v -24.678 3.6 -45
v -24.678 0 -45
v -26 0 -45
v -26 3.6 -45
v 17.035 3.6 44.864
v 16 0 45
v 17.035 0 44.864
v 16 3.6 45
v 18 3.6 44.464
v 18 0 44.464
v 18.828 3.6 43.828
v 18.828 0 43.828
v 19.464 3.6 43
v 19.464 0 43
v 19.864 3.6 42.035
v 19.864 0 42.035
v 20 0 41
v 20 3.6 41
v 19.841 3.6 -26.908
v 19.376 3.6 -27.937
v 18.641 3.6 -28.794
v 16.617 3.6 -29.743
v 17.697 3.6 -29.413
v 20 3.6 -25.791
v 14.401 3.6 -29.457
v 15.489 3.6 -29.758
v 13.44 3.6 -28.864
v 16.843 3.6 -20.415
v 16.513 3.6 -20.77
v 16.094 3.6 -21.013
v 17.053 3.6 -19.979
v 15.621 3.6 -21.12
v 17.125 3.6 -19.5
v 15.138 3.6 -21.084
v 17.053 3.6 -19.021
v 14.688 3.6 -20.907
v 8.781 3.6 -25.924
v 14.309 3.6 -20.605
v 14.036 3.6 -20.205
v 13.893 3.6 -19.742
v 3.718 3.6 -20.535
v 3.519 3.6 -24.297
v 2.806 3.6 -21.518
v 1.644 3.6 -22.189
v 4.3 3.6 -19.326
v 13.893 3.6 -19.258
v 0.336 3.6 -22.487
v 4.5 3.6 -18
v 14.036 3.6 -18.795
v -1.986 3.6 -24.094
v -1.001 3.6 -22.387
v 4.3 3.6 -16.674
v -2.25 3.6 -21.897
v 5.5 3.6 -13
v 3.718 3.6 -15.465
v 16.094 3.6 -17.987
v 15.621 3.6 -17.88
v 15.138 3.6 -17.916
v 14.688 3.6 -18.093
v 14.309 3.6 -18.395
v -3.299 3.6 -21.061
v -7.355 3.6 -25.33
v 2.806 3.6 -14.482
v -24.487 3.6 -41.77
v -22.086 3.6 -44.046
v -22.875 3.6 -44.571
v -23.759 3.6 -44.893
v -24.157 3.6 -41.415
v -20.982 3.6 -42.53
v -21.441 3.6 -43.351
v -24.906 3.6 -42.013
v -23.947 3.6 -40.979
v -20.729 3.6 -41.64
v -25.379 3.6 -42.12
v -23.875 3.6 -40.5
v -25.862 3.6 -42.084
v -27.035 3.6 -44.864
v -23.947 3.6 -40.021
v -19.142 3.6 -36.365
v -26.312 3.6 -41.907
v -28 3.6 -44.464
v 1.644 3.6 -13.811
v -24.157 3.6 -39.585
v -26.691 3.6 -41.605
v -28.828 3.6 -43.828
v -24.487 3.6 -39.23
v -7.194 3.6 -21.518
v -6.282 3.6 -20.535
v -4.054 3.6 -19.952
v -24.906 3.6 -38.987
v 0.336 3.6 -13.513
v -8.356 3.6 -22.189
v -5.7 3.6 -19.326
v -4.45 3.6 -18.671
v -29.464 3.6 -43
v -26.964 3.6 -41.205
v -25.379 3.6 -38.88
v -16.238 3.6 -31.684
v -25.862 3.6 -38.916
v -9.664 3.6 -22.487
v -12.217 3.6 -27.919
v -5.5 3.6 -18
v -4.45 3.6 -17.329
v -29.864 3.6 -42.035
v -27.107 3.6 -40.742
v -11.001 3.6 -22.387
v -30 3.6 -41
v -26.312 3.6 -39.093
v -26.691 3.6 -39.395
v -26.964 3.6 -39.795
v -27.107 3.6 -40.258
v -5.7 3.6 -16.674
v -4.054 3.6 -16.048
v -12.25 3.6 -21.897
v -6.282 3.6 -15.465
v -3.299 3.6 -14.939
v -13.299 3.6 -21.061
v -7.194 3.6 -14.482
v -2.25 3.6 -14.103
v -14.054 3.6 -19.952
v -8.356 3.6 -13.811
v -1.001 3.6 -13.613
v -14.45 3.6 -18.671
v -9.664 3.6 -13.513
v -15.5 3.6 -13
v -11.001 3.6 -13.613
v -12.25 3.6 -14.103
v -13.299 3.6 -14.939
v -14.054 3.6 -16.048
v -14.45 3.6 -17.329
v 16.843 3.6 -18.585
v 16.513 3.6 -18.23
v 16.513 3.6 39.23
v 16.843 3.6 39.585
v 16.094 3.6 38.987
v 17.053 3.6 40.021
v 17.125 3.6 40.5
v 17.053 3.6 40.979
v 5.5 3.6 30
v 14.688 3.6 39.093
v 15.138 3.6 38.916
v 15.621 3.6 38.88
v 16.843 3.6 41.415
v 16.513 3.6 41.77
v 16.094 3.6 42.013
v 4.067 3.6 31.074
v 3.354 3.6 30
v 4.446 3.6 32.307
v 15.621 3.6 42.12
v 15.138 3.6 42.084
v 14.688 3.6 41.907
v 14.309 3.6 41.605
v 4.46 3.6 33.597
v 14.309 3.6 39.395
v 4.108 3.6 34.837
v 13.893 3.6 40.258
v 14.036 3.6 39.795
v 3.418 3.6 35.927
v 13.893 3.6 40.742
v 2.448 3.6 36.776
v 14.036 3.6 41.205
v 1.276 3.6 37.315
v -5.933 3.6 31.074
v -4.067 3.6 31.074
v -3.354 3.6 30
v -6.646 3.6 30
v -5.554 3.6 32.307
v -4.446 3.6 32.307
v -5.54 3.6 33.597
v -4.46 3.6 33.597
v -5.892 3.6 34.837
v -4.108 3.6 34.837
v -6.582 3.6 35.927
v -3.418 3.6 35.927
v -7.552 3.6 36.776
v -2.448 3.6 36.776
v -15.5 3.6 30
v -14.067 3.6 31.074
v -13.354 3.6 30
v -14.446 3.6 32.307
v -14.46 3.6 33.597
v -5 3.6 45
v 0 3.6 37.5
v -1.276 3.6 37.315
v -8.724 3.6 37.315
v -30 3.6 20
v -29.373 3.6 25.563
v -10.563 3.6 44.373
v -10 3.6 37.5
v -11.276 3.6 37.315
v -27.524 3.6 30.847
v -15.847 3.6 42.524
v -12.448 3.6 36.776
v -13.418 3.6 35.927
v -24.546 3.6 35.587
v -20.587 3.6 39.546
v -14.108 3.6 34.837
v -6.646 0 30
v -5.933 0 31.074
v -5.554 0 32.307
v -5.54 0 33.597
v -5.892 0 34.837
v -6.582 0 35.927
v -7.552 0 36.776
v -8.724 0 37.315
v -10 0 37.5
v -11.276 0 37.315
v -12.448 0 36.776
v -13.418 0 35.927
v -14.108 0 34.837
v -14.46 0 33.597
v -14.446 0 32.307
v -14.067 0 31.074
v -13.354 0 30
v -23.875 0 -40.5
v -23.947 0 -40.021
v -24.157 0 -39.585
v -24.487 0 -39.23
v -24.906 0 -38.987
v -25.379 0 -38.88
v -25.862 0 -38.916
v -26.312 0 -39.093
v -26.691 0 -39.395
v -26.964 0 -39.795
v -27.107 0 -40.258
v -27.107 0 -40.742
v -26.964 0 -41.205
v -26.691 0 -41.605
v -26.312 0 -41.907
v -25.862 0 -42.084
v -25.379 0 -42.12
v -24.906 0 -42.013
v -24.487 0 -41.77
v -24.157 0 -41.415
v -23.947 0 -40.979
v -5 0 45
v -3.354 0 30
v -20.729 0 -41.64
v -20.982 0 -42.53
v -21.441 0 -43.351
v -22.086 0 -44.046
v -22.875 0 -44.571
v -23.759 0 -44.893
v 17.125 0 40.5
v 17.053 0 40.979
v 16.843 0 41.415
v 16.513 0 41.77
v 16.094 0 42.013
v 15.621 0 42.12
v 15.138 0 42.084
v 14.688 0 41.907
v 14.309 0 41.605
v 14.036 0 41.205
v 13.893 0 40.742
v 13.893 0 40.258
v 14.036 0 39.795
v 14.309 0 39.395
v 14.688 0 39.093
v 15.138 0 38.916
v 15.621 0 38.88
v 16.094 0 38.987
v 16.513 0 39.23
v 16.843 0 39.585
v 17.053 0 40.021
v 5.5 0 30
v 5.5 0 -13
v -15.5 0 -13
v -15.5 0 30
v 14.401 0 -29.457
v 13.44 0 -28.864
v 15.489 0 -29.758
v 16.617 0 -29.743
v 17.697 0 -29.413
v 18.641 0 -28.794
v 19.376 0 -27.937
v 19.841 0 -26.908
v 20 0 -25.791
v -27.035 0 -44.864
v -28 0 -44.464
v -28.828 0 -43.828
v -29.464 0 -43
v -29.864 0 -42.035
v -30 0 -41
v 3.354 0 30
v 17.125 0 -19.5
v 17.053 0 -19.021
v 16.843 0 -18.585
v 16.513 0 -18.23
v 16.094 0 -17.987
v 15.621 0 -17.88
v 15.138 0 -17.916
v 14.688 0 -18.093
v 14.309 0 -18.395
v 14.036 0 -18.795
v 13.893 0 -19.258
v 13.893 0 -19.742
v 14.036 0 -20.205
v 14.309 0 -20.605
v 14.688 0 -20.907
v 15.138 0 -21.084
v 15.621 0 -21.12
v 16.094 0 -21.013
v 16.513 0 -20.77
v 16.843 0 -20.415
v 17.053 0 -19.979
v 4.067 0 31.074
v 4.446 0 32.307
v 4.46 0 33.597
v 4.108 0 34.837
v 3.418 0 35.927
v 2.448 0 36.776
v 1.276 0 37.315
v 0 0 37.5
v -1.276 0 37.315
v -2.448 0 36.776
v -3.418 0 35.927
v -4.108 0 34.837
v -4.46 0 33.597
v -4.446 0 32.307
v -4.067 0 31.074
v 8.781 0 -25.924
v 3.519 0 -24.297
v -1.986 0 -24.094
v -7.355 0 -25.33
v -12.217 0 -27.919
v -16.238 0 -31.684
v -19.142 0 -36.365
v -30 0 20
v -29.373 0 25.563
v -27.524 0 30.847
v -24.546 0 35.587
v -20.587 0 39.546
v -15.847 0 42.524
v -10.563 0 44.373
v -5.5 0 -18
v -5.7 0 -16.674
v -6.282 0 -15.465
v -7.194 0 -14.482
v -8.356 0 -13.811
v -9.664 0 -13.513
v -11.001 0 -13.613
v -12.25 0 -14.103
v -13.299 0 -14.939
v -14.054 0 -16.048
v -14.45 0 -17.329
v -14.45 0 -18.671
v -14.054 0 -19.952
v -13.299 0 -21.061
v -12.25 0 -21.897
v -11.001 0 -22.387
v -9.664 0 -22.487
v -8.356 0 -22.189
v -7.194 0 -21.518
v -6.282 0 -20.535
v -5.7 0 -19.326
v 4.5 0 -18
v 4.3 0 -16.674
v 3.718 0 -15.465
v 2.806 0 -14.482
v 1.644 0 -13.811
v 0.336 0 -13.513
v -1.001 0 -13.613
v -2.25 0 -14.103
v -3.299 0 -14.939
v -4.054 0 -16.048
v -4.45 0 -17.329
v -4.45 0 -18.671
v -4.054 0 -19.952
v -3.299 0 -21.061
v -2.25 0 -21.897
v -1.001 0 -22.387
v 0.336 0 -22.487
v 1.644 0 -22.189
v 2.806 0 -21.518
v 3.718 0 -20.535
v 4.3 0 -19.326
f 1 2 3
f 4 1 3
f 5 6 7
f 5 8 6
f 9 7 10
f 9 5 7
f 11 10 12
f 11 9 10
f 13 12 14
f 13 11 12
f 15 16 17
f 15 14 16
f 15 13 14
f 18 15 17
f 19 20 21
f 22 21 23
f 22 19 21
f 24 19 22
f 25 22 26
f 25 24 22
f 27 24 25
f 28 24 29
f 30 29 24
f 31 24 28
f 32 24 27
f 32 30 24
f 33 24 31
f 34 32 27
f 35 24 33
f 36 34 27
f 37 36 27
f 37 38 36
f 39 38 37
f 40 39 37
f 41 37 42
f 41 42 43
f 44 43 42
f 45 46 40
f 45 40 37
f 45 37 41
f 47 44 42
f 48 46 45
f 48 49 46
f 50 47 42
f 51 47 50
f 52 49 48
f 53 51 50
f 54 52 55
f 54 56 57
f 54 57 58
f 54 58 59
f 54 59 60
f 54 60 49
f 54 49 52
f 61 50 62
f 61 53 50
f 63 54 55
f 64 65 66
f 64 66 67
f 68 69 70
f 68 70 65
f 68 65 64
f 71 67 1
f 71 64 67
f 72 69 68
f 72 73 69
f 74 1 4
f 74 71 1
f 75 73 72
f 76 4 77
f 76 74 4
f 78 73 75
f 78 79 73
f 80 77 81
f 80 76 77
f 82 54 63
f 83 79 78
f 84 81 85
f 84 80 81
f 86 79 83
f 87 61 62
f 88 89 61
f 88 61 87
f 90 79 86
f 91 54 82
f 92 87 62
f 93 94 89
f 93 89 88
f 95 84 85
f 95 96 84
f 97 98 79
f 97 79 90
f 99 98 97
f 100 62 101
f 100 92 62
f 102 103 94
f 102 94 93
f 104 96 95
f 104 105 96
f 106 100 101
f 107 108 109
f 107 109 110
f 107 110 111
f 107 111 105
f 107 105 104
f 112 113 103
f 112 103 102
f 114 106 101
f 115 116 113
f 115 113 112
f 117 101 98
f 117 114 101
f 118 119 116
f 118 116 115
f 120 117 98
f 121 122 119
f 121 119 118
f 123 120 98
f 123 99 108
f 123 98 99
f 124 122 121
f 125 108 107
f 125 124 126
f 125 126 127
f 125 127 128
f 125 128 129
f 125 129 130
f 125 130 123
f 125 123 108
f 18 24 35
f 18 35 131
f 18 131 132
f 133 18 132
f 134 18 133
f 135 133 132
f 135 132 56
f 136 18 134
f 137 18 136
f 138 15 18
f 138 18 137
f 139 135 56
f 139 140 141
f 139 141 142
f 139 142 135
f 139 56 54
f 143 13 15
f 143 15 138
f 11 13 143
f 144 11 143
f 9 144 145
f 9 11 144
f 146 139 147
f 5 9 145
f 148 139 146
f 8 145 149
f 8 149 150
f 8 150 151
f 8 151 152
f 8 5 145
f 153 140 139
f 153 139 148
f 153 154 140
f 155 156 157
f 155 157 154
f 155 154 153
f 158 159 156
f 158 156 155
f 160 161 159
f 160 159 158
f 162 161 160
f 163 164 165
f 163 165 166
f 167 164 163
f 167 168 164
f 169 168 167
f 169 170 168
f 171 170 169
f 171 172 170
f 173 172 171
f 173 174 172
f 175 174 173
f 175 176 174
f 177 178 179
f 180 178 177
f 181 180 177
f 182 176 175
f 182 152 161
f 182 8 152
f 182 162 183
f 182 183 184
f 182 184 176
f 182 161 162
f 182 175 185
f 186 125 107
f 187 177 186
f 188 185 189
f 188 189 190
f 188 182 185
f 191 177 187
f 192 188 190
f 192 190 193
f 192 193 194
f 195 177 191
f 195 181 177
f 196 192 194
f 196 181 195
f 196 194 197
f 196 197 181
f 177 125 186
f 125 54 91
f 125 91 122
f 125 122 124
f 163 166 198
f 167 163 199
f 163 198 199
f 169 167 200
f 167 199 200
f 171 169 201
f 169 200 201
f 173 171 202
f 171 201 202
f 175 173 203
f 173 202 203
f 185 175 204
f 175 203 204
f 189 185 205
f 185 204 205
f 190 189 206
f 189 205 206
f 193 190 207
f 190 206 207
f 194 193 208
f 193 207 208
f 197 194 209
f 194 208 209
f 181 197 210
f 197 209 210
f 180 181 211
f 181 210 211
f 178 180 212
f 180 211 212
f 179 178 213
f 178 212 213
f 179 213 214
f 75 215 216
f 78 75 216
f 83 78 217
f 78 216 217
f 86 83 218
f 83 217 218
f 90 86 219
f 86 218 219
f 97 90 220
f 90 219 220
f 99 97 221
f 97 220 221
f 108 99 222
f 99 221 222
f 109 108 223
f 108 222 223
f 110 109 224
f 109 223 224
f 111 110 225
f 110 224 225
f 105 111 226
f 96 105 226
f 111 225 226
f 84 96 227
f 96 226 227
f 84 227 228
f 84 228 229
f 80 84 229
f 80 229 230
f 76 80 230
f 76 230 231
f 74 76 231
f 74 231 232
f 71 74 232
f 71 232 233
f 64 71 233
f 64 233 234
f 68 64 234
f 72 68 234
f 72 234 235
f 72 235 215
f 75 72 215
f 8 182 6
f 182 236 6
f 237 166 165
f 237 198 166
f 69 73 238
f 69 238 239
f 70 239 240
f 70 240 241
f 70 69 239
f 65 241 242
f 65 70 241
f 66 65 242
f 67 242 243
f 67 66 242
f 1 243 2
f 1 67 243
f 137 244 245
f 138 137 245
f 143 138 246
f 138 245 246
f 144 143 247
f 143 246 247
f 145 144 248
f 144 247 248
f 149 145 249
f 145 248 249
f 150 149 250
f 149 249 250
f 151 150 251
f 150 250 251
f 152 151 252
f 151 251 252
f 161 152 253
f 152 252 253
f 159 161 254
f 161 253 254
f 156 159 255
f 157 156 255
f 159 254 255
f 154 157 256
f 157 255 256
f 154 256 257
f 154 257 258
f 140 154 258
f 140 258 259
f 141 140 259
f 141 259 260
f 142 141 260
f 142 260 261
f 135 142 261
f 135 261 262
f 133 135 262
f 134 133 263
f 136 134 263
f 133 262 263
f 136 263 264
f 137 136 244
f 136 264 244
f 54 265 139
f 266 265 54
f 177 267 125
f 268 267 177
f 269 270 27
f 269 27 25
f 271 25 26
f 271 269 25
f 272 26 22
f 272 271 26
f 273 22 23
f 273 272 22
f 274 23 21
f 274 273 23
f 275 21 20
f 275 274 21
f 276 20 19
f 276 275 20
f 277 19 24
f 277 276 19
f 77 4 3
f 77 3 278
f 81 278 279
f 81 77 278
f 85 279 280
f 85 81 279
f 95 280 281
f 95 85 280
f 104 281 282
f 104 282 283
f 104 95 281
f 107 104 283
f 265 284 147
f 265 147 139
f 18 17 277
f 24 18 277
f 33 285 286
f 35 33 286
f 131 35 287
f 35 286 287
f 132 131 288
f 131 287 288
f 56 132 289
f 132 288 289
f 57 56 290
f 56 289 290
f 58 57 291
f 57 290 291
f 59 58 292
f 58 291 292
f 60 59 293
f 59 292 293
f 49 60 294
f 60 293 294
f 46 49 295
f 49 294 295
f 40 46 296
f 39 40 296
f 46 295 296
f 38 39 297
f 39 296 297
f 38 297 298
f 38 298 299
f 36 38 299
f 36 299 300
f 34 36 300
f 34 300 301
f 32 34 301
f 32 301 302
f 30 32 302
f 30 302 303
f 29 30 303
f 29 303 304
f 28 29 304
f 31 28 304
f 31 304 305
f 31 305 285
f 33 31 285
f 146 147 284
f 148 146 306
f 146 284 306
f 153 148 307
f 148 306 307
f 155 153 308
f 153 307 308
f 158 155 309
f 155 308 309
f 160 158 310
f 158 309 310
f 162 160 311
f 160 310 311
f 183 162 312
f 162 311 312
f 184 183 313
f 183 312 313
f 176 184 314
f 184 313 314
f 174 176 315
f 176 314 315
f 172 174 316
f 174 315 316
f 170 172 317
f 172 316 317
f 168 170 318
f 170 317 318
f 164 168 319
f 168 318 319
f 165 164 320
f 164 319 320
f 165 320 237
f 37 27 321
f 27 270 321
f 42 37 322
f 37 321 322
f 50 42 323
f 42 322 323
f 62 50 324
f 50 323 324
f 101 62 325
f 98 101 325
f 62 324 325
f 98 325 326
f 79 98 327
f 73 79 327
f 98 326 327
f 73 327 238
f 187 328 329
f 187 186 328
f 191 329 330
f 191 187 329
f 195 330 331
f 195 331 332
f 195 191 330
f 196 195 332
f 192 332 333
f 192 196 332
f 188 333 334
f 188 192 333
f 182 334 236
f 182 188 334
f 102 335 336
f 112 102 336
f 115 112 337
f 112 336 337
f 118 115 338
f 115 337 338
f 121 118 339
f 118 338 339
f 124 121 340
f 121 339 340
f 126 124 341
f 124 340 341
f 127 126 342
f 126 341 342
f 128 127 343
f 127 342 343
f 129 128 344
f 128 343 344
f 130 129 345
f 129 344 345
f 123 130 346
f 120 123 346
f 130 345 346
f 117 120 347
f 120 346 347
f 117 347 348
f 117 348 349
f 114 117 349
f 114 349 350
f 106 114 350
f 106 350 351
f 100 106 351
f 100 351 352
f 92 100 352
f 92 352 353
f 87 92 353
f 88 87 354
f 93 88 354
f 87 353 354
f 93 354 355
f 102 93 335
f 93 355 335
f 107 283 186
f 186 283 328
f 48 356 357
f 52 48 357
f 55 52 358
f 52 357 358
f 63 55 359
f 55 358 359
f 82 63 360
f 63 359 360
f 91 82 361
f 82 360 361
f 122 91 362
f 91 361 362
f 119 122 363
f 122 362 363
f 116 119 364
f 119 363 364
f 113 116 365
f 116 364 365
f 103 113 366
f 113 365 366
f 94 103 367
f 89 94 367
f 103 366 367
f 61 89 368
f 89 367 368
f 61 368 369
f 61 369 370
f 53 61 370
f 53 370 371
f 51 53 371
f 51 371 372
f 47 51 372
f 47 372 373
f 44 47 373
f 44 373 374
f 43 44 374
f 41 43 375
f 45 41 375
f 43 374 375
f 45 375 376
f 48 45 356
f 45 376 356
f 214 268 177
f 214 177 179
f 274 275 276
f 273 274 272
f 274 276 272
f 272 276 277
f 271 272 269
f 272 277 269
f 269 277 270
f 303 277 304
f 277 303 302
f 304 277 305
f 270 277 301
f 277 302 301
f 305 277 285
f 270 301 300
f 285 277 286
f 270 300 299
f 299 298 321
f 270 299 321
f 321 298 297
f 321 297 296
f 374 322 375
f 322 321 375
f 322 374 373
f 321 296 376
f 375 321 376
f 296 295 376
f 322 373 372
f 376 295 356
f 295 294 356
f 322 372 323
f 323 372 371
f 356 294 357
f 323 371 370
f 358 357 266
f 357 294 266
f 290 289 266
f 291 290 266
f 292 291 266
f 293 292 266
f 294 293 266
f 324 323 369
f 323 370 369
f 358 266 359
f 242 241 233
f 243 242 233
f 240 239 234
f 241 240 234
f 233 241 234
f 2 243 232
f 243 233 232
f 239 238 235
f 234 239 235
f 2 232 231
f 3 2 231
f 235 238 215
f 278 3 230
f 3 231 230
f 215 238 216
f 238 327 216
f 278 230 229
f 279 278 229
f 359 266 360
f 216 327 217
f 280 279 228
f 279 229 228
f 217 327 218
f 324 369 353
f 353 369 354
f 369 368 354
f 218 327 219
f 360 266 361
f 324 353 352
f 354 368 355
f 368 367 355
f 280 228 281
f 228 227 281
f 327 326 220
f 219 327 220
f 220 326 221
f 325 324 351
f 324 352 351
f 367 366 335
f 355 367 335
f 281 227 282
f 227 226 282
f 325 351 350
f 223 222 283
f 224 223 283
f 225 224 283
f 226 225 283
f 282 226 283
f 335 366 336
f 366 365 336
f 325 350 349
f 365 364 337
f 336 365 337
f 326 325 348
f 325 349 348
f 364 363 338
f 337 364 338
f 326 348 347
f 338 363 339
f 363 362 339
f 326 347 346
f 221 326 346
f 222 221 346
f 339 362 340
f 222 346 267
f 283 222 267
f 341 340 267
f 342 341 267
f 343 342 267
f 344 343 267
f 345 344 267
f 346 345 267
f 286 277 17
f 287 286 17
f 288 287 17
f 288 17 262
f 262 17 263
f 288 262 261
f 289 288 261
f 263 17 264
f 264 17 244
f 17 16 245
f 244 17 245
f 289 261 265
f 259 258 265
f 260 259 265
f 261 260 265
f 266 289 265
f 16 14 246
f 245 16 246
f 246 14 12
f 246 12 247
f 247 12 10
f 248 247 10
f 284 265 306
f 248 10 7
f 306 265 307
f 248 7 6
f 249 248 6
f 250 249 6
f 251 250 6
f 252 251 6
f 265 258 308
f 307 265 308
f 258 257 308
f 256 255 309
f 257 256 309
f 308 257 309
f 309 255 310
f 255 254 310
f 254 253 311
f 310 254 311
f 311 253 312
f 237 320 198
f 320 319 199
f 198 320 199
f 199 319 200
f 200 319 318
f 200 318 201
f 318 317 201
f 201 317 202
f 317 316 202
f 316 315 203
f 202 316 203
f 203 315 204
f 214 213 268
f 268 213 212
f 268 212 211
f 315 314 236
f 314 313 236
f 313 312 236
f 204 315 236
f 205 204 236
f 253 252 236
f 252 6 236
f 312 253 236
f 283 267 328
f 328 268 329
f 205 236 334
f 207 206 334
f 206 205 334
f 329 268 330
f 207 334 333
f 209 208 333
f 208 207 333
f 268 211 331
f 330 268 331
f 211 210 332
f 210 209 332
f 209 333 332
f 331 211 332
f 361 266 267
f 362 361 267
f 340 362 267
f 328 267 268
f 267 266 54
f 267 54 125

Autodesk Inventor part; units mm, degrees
ref_plane "YZ Plane" through (0, 0, 0) normal (1, 0, 0) x (0, 1, 0)
ref_plane "XZ Plane" through (0, 0, 0) normal (0, 1, 0) x (-1, 0, 0)
ref_plane "XY Plane" through (0, 0, 0) normal (0, 0, 1) x (1, 0, 0)
sketch "Sketch1" plane through (0, 0, 0) normal (0, 1, 0) x (-1, 0, 0)
  line L0 (20, 45) -> (-20, 45)
  line L1 (-20, 45) -> (-20, -45)
  line L2 (-20, -45) -> (20, -45)
  line L3 (20, -45) -> (20, 45)
  line L4 (20, 45) -> (-20, -45) construction
  line L5 (-20, 45) -> (20, -45) construction
  arc A0 (-20, -45) -> (20, -45) centre (0, -45) ccw
  line L6 (20, -45) -> (30, -45)
  line L7 (30, -45) -> (30, 45)
  line L8 (30, 45) -> (20, 45)
  line L9 (20, 45) -> (20, -45)
  point P0 (0, 0)
  dimension "d0" = 40
  dimension "d1" = 90
  dimension "d7" = 10
  dimension "d8" = 90
extrude "Extrusion1" add sketch "Sketch1" along normal blind 3.6
fillet "Fillet1" radius 4 3 edges at (-20, 1.8, -45) (-30, 1.8, -45) (20, 1.8, 45)
sketch "Sketch3" plane through (0, 0, 0) normal (0, -1, 0) x (1, 0, 0)
  circle A0 centre (0, -45) radius 21
  arc A1 (-19.7203, -48.3333) -> (20, -45) centre (0, -45) ccw projected
  point P0 (0, 0)
  dimension "d10" = 42
  dimension "d11" = 0
extrude "Extrusion3" cut sketch "Sketch3" against normal blind 10
fillet "Fillet2" radius 4 2 edges at (20, 1.8, -38.5969) (-20.9742, 1.8, -46.0397)
sketch "Sketch4" plane through (0, 0, 0) normal (0, -1, 0) x (1, 0, 0)
  circle A0 centre (-25.5, -40.5) radius 1.625
  line L0 (-24.6779, -45) -> (-26, -45) projected
  circle A1 centre (15.5, -19.5) radius 1.625
  circle A2 centre (15.5, 40.5) radius 1.625
  line L1 (20, 41) -> (20, -25.7906) projected
  arc A3 (13.44, -28.8641) -> (20, -25.7906) centre (16, -25.7906) ccw projected
  line L2 (-30, -41) -> (-30, 45) projected
  line L3 (-30, 45) -> (16, 45) projected
  point P0 (0, 0)
  point P1 (-30, 41)
  point P2 (-26, 45)
  dimension "d15" = 3.25
  dimension "d16" = 4.5
  dimension "d21" = 3.25
  dimension "d22" = 3.25
  dimension "d23" = 4.5
  dimension "d25" = 4.5
  dimension "d29" = 4.5
  dimension "d30" = 4.5
  dimension "d31" = 60
extrude "Extrusion4" cut sketch "Sketch4" against normal blind 7
sketch "Sketch5" plane through (0, 0, 0) normal (0, -1, 0) x (1, 0, 0)
  line L0 (-15.5, 30) -> (5.5, 30)
  line L1 (5.5, 30) -> (5.5, -13)
  line L2 (5.5, -13) -> (-15.5, -13)
  line L3 (-15.5, -13) -> (-15.5, 30)
  line L4 (-15.5, 30) -> (5.5, -13) construction
  line L5 (5.5, 30) -> (-15.5, -13) construction
  line L6 (-24.6779, -45) -> (-26, -45) projected
  line L7 (-30, -41) -> (-30, 45) projected
  point P0 (0, 0)
  point P1 (-5, 8.5)
  point P2 (-30, 41)
  dimension "d32" = 21
  dimension "d33" = 43
  dimension "d34" = 32
  dimension "d35" = 14.5
extrude "Extrusion5" cut sketch "Sketch5" against normal blind 10
sketch "Sketch6" plane through (0, 0, 0) normal (0, -1, 0) x (1, 0, 0)
  circle A0 centre (0, -18) radius 4.5
  circle A1 centre (0, 33) radius 4.5
  circle A2 centre (-10, -18) radius 4.5
  circle A3 centre (-10, 33) radius 4.5
  line L0 (5.5, 30) -> (5.5, -13) projected
  line L1 (5.5, -13) -> (-15.5, -13) projected
  point P0 (0, 0)
  dimension "d38" = 9
  dimension "d39" = 9
  dimension "d40" = 51
  dimension "d41" = 9
  dimension "d42" = 9
  dimension "d43" = 10
  dimension "d44" = 10
  dimension "d45" = 51
  dimension "d46" = 90
  dimension "d47" = 5.5
  dimension "d48" = 5
extrude "Extrusion6" cut sketch "Sketch6" against normal blind 10
fillet "Fillet3" radius 25 1 edges at (-30, 1.8, 45)
properties part number "p1"
